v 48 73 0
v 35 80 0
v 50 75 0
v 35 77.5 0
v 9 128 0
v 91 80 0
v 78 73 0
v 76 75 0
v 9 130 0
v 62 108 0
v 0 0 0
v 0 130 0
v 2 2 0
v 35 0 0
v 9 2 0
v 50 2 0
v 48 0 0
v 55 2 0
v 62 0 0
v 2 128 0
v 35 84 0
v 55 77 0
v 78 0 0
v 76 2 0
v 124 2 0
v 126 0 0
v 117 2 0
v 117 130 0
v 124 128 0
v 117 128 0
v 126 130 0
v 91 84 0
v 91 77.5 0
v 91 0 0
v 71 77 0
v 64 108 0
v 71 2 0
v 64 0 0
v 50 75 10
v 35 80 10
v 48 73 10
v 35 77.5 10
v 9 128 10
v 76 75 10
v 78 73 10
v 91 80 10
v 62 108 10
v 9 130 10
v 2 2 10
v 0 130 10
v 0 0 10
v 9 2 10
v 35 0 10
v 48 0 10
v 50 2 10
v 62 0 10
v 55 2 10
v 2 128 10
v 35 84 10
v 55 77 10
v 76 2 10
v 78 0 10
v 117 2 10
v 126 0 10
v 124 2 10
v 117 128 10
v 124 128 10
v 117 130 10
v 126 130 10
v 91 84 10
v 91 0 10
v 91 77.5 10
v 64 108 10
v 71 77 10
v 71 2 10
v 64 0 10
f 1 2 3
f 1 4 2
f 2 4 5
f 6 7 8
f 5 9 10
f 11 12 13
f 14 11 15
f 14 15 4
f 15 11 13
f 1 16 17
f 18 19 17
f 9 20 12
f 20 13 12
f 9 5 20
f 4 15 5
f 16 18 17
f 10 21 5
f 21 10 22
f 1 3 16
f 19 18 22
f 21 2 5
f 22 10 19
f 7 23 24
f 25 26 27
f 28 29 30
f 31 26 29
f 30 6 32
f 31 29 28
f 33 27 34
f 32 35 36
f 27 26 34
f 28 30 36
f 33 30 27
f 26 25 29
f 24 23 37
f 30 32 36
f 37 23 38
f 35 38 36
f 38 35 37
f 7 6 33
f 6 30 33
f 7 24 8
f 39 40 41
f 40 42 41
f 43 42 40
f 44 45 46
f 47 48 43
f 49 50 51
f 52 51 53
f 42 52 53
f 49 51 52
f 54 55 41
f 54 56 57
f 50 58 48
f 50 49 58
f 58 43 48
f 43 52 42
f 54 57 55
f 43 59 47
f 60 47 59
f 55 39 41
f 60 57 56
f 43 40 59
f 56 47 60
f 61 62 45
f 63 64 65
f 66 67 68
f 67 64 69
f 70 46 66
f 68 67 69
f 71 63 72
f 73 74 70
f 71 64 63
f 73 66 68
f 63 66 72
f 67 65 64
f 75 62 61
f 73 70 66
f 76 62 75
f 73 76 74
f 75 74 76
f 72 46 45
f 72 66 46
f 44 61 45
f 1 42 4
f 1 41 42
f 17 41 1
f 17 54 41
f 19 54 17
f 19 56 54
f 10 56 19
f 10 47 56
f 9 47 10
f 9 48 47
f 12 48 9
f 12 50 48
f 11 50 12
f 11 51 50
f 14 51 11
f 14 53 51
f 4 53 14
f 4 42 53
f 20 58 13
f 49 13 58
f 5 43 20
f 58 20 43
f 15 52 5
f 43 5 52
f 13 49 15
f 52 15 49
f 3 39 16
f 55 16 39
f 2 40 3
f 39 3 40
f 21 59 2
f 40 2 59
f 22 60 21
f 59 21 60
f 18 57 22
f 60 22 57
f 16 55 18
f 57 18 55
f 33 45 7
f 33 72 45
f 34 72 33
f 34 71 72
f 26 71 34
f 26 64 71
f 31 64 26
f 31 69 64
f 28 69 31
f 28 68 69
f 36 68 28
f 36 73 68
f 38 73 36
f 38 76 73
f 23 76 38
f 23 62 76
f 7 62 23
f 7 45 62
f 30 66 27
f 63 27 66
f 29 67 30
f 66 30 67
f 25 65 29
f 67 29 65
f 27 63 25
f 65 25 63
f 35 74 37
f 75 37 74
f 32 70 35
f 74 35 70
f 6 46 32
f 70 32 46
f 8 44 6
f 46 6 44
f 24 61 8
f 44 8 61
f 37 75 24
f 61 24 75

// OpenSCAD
module render_master_half() {
 polygon(points=[
    [0,0],[0,130],[9,130],[62,108],[62,0],[50,0],[50,2],[55,2],
    [55,77],[35,84],[35,80],[50,75],[50,0],[48,0],[48,73],[35,77.5],
    [35,0],[9,0],[9,128],[2,128],[2,2],[9,2],[9,0]]);
};

module render_master() {
render_master_half();
translate([126,0,0]) mirror(v=1,0,0) render_master_half();
};

linear_extrude(height=10)
render_master();
